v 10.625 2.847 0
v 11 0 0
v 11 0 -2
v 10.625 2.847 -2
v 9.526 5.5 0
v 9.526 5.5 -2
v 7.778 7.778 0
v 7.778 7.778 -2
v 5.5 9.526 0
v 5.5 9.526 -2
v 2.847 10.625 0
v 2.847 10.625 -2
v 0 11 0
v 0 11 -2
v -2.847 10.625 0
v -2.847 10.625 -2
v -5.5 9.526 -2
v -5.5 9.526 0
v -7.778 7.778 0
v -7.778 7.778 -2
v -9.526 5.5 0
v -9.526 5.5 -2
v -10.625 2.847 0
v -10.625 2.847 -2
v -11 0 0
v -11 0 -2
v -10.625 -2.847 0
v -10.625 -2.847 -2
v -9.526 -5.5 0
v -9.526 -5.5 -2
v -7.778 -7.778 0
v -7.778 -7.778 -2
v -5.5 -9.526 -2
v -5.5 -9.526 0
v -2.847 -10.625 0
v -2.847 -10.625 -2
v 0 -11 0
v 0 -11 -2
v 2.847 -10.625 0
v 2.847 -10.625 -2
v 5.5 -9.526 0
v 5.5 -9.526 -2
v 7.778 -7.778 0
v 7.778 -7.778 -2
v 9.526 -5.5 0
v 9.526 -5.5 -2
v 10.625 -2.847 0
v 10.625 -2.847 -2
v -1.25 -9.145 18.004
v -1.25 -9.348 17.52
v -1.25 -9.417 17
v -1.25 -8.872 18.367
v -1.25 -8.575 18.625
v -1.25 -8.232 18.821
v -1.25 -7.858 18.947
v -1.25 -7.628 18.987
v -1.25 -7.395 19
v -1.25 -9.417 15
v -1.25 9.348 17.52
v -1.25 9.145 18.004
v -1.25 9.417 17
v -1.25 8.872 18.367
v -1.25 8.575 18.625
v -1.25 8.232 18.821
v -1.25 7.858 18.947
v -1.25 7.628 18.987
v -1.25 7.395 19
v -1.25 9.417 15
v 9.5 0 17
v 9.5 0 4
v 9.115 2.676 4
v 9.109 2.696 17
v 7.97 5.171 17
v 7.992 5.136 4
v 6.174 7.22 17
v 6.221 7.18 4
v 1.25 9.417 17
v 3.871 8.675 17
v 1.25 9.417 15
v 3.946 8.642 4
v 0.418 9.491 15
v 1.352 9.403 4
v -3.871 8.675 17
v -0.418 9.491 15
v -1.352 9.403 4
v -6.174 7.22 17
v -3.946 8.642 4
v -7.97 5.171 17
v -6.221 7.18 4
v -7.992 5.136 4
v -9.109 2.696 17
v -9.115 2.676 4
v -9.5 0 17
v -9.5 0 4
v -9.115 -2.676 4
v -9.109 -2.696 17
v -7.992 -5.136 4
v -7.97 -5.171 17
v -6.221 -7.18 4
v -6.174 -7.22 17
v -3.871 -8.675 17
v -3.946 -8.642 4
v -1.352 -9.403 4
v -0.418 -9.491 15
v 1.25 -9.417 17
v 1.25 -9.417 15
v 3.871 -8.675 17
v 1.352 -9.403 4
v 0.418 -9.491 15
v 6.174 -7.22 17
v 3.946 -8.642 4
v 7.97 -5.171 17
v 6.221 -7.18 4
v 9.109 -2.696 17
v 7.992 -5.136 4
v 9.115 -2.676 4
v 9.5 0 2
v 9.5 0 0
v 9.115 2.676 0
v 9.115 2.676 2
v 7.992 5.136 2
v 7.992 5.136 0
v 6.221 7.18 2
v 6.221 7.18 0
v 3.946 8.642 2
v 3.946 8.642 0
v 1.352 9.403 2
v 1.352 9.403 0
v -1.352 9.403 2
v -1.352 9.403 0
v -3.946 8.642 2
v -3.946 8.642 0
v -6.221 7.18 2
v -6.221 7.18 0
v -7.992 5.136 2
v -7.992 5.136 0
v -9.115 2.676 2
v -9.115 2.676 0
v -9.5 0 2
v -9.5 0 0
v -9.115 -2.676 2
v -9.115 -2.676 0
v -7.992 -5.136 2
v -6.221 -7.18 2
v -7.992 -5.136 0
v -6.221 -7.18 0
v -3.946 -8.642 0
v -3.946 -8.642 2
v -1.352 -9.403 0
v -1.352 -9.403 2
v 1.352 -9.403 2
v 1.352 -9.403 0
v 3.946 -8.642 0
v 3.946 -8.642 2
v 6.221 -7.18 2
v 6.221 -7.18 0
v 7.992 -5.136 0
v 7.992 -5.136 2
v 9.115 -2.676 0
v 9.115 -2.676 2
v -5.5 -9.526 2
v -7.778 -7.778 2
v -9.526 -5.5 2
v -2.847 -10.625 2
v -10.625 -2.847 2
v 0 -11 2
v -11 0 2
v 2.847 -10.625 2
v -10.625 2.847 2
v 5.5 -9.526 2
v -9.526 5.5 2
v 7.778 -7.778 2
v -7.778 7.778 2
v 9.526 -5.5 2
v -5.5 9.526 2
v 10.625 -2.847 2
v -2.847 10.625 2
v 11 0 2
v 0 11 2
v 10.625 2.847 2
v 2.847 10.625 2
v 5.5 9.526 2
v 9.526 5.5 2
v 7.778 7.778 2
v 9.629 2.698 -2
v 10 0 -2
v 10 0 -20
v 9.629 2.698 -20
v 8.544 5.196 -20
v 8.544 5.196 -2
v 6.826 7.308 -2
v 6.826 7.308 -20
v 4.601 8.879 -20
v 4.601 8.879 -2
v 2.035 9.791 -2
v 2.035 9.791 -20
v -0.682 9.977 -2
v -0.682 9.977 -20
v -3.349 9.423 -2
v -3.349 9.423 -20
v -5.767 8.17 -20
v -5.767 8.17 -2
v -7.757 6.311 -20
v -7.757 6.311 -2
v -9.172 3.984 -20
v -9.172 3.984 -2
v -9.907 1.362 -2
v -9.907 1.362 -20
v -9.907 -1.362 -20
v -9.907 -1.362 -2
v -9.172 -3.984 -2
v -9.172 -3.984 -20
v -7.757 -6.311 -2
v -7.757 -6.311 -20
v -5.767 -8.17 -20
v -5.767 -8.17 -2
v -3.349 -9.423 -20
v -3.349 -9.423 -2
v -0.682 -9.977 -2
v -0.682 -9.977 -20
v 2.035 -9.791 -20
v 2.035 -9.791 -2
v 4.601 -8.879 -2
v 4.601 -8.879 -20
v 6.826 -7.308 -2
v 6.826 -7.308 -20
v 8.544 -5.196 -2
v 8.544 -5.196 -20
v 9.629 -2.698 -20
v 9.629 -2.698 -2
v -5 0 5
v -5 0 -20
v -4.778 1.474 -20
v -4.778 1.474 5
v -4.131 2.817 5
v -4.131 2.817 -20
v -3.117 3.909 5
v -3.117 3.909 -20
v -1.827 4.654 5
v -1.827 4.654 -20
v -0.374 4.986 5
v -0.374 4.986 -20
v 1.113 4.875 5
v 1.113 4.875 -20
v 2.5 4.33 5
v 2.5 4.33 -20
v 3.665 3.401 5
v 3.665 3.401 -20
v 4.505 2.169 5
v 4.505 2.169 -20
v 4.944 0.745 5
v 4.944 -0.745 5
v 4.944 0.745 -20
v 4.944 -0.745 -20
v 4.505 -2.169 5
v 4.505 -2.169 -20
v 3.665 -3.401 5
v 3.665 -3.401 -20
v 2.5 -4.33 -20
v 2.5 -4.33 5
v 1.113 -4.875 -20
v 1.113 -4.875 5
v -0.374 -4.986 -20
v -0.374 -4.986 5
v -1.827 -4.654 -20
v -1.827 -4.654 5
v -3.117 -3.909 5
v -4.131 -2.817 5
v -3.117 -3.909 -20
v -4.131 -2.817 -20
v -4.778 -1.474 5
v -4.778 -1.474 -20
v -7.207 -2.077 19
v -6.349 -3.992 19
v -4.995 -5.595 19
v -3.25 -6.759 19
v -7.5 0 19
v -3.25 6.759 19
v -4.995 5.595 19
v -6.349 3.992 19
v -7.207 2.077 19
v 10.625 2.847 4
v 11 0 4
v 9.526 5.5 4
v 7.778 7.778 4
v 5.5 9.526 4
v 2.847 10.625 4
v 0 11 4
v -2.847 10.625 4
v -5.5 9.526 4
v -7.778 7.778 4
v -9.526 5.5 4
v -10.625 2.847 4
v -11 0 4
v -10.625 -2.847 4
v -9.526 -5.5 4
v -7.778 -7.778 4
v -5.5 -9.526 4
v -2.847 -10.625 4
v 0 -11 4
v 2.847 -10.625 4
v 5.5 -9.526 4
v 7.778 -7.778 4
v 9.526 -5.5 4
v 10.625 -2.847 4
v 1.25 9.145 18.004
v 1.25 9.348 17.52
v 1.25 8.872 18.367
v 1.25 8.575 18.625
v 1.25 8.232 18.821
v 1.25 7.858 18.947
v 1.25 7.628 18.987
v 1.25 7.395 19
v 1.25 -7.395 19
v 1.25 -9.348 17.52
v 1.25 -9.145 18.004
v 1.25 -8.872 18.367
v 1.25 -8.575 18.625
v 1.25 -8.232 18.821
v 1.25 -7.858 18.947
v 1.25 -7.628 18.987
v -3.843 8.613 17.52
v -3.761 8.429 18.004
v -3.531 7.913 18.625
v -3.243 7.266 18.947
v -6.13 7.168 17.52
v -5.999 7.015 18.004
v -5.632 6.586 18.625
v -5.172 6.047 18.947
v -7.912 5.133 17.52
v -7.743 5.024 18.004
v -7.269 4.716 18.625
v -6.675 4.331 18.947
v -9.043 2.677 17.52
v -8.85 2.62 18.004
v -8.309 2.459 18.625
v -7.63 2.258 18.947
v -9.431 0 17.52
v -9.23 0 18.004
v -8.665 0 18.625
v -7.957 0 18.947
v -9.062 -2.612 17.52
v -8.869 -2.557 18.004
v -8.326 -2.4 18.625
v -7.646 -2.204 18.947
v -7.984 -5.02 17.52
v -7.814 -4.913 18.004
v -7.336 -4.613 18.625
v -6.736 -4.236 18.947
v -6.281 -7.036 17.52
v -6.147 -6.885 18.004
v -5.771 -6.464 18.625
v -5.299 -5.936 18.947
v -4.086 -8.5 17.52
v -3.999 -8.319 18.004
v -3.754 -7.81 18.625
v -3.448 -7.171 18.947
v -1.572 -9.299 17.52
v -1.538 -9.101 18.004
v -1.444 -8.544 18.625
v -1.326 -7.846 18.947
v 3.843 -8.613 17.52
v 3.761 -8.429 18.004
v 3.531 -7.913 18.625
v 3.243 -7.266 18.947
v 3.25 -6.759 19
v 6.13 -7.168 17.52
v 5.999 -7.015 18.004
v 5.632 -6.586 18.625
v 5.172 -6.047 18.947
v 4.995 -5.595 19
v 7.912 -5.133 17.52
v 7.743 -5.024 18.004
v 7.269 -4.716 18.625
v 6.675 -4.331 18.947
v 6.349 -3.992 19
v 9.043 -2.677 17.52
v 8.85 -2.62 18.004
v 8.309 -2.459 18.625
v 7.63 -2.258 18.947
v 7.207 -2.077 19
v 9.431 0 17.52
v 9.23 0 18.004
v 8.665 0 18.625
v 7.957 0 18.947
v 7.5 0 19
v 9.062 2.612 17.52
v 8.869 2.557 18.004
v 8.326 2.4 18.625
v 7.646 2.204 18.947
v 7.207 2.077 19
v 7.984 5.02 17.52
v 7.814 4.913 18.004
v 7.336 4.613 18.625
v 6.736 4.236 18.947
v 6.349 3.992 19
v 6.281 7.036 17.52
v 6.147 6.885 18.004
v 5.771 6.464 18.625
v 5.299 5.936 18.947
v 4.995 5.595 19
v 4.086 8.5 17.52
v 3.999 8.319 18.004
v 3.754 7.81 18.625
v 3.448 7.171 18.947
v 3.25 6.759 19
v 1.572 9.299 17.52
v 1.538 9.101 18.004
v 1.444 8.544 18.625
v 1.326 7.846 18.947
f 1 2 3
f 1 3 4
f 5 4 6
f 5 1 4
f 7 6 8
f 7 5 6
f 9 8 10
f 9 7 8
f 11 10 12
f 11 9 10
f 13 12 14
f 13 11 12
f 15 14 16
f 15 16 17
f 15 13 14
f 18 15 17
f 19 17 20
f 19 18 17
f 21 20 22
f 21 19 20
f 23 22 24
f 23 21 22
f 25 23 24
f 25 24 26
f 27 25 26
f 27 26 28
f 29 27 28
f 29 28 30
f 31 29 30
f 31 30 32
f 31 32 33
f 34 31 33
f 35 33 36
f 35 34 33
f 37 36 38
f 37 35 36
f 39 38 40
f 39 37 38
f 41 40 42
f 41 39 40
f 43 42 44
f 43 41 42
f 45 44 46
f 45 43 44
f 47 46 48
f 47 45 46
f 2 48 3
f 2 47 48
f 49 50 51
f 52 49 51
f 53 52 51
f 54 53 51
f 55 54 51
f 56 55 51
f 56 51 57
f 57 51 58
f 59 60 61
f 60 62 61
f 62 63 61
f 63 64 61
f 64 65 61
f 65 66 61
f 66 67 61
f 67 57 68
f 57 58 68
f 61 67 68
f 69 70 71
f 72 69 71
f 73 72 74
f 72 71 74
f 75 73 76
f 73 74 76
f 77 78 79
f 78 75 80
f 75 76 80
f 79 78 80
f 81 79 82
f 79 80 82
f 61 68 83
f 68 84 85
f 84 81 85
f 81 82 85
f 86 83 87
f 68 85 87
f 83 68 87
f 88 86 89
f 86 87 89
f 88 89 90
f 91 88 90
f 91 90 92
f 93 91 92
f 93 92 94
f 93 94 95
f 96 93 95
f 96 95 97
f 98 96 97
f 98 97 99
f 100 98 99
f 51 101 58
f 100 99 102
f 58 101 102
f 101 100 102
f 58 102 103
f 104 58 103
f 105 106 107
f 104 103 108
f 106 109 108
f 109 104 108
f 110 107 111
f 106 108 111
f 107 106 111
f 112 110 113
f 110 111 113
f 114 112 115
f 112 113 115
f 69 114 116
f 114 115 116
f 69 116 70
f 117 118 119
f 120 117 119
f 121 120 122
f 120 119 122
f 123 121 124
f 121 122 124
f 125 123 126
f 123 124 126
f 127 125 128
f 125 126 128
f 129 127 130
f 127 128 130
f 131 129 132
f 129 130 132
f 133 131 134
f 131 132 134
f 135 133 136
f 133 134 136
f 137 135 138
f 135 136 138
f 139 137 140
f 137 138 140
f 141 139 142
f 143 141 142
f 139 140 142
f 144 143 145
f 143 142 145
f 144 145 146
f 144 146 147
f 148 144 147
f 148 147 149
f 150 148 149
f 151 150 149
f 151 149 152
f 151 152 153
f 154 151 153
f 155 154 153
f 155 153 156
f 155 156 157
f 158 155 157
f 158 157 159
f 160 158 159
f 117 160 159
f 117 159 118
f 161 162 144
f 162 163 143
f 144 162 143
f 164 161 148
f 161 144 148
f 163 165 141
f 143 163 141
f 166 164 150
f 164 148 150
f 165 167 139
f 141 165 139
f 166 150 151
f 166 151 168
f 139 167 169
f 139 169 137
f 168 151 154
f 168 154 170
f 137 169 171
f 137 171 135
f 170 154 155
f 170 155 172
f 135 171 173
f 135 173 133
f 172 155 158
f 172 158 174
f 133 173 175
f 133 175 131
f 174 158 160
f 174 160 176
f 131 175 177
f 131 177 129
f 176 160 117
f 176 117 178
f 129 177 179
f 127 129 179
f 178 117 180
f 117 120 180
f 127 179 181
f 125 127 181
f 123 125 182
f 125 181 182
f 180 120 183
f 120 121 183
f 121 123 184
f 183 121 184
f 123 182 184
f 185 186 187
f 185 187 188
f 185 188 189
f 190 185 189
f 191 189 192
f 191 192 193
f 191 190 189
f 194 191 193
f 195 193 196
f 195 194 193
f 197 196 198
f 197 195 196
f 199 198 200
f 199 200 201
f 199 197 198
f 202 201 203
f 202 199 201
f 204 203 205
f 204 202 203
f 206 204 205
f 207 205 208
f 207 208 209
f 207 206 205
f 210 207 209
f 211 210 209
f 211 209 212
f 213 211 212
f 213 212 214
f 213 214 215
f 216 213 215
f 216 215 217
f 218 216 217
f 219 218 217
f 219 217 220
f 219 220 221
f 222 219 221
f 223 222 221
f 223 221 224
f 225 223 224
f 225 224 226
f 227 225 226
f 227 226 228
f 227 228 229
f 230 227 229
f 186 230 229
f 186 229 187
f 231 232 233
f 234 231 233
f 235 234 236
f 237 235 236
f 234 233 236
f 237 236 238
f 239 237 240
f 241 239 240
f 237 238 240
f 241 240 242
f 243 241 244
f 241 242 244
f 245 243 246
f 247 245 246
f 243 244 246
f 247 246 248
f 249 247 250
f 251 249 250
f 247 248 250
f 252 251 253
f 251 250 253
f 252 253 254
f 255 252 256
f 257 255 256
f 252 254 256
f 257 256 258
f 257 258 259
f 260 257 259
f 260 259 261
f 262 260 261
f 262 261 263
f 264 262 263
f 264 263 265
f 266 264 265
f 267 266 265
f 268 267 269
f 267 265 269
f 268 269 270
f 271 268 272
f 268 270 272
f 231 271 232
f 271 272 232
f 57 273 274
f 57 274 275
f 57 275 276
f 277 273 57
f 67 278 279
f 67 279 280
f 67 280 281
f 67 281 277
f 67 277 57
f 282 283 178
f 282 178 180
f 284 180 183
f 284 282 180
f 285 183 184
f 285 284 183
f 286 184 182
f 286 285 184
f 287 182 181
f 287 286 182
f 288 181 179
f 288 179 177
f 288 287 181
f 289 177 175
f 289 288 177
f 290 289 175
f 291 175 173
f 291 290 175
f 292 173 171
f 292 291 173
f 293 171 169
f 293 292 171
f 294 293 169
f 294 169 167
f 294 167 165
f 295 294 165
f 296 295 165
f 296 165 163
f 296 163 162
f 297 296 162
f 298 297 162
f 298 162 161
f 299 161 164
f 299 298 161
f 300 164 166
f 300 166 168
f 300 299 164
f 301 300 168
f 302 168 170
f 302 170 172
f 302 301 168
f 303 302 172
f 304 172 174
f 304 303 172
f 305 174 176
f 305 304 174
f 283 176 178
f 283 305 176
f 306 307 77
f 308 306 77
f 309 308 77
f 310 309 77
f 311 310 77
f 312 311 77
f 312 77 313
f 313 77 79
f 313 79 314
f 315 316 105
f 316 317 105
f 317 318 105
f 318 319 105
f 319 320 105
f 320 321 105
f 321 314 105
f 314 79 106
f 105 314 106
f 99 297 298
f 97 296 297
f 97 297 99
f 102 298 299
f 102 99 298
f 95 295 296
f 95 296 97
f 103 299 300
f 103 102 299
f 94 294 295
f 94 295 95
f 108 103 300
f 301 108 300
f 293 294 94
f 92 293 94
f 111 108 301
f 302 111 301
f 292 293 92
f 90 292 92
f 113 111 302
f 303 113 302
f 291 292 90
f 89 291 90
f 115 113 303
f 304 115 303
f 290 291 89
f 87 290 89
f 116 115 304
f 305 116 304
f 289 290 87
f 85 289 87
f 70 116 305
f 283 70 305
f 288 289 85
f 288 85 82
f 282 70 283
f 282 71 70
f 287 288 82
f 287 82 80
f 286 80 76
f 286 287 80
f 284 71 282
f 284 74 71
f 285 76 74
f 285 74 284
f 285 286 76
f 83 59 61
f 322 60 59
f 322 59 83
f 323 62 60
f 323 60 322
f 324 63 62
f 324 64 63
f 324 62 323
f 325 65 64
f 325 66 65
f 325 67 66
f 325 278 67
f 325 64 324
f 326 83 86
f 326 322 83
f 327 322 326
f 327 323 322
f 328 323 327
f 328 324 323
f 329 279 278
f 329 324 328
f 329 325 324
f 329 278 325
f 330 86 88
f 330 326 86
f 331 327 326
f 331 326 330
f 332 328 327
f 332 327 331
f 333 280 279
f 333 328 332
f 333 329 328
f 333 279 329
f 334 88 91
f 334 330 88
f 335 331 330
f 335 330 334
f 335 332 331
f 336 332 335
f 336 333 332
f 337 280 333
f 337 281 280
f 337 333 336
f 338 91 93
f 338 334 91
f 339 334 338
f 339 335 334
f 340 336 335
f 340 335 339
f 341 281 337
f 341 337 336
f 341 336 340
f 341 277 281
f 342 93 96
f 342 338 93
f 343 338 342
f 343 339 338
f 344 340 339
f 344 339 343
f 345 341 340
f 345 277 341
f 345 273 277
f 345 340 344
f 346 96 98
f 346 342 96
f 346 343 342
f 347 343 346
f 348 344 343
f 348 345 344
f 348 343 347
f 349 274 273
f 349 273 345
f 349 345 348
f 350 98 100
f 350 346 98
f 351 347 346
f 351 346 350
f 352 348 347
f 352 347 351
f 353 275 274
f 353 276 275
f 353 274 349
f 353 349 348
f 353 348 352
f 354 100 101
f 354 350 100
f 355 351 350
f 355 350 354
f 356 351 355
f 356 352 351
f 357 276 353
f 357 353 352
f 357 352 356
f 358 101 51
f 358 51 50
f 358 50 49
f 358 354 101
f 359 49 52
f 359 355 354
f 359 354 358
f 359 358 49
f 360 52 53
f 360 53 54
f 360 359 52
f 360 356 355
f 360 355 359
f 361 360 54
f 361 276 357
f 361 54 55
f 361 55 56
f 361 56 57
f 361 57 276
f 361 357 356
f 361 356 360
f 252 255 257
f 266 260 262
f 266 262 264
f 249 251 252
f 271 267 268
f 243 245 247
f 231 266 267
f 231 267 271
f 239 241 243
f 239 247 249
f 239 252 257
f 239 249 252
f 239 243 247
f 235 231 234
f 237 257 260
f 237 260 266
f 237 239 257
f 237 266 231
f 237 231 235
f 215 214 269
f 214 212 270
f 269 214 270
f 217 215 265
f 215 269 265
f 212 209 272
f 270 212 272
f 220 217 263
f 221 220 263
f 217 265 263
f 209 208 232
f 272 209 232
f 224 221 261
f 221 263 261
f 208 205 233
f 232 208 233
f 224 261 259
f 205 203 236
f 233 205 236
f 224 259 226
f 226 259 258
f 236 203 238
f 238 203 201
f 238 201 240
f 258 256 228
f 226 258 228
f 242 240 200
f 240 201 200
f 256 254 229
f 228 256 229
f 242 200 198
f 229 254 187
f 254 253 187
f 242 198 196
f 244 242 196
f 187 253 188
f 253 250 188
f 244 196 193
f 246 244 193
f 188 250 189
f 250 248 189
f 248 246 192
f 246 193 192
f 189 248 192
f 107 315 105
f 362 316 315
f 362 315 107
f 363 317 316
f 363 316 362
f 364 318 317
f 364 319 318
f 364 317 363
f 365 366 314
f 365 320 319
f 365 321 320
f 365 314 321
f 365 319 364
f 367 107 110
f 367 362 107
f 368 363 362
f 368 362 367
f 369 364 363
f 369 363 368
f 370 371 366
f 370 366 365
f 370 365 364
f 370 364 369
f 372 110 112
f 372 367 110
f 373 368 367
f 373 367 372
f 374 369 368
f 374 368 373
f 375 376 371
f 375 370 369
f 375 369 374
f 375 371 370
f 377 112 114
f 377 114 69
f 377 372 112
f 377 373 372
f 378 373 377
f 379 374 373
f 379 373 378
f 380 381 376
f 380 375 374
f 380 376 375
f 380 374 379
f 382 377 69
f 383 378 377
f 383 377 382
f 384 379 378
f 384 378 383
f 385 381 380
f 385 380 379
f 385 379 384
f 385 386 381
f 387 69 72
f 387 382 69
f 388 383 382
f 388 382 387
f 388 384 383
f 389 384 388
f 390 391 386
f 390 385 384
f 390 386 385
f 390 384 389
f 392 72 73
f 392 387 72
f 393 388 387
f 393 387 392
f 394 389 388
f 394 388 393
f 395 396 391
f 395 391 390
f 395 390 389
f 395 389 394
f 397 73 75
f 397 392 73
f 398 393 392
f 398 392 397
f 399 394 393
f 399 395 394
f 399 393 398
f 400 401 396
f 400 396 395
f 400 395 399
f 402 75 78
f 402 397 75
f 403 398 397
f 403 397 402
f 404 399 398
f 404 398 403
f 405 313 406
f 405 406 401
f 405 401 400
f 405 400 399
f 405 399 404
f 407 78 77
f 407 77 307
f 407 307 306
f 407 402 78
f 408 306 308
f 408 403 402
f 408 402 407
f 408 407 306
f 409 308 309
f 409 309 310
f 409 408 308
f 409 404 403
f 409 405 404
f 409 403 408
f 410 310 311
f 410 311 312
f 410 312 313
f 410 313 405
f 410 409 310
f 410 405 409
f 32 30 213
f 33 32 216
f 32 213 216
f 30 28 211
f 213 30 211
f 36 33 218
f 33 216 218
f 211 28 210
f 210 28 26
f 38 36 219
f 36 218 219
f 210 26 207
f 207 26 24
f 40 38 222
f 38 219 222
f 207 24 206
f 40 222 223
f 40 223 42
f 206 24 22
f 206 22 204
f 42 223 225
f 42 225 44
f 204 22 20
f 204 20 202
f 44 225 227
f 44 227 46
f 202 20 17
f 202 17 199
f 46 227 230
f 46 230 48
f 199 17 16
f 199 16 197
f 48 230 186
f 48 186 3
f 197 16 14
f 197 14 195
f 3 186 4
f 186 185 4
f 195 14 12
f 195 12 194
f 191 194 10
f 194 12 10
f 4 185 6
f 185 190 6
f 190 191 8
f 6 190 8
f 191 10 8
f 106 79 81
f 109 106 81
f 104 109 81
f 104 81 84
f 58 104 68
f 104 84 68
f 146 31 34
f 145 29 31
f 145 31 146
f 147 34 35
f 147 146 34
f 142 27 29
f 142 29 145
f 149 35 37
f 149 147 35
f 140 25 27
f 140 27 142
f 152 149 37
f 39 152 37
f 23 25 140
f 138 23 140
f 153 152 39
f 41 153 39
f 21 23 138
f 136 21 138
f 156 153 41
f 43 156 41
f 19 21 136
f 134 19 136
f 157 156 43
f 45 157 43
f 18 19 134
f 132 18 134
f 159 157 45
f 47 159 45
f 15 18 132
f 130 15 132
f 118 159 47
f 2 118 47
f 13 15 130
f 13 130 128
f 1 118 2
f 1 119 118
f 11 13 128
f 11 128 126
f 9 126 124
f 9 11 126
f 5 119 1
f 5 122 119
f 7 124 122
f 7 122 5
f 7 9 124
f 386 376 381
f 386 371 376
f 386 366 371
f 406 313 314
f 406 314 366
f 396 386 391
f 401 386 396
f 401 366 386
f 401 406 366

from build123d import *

# Parameters (mm, degrees)
SKETCH1_R           = 9.5
BOSS_EXTRUDE1_DEPTH = 19
SKETCH1_5_R         = 10
BOSS_EXTRUDE4_DEPTH = 20
BOSS_EXTRUDE2_START = 2
SKETCH1_3_R         = 11
SKETCH1_3_R_2       = 9.5
BOSS_EXTRUDE2_DEPTH = 2
SKETCH1_4_R         = 11
SKETCH1_4_R_2       = 10
BOSS_EXTRUDE3_DEPTH = 2
FILLET1_R           = 2
CUT_EXTRUDE3_START  = -4
CUT_EXTRUDE3_DEPTH  = 4
SKETCH6_R           = 5
CUT_EXTRUDE4_DEPTH  = 25


with BuildPart() as part:
    # Sketch1 → Boss-Extrude1 (new body)
    with BuildSketch(Plane.XY):
        Circle(SKETCH1_R)
    extrude(amount=BOSS_EXTRUDE1_DEPTH)

    # Sketch1<5> → Boss-Extrude4 (add)
    with BuildSketch(Plane.XY):
        Circle(SKETCH1_5_R)
    extrude(amount=-BOSS_EXTRUDE4_DEPTH)

    # Sketch1<3> → Boss-Extrude2 (add)
    with BuildSketch(Plane.XY.offset(BOSS_EXTRUDE2_START)):
        Circle(SKETCH1_3_R)
        Circle(SKETCH1_3_R_2, mode=Mode.SUBTRACT)
    extrude(amount=BOSS_EXTRUDE2_DEPTH)

    # Sketch1<4> → Boss-Extrude3 (add)
    with BuildSketch(Plane.XY):
        Circle(SKETCH1_4_R)
        Circle(SKETCH1_4_R_2, mode=Mode.SUBTRACT)
    extrude(amount=-BOSS_EXTRUDE3_DEPTH)

    # Fillet1
    fillet1_edges = [part.edges().sort_by_distance(p)[0] for p in [
        (-9.5, 0, 19),
    ]]
    fillet(fillet1_edges, radius=FILLET1_R)

    # Sketch4 → Cut-Extrude3 (cut)
    with BuildSketch(Plane.XY.offset(19).offset(CUT_EXTRUDE3_START)):
        with BuildLine():
            Line((-1.25, -9.417404101), (-1.25, 9.417404101))
            ThreePointArc((-1.25, 9.417404101), (0, 9.5), (1.25, 9.417404101))
            Line((1.25, 9.417404101), (1.25, -9.417404101))
            ThreePointArc((1.25, -9.417404101), (0, -9.5), (-1.25, -9.417404101))
        make_face()
    extrude(amount=CUT_EXTRUDE3_DEPTH, mode=Mode.SUBTRACT)

    # Sketch6 → Cut-Extrude4 (cut)
    with BuildSketch(Plane(origin=(0, 0, -20), x_dir=(-1, 0, 0), z_dir=(0, 0, -1))):
        Circle(SKETCH6_R)
    extrude(amount=-CUT_EXTRUDE4_DEPTH, mode=Mode.SUBTRACT)


solid = part.part
